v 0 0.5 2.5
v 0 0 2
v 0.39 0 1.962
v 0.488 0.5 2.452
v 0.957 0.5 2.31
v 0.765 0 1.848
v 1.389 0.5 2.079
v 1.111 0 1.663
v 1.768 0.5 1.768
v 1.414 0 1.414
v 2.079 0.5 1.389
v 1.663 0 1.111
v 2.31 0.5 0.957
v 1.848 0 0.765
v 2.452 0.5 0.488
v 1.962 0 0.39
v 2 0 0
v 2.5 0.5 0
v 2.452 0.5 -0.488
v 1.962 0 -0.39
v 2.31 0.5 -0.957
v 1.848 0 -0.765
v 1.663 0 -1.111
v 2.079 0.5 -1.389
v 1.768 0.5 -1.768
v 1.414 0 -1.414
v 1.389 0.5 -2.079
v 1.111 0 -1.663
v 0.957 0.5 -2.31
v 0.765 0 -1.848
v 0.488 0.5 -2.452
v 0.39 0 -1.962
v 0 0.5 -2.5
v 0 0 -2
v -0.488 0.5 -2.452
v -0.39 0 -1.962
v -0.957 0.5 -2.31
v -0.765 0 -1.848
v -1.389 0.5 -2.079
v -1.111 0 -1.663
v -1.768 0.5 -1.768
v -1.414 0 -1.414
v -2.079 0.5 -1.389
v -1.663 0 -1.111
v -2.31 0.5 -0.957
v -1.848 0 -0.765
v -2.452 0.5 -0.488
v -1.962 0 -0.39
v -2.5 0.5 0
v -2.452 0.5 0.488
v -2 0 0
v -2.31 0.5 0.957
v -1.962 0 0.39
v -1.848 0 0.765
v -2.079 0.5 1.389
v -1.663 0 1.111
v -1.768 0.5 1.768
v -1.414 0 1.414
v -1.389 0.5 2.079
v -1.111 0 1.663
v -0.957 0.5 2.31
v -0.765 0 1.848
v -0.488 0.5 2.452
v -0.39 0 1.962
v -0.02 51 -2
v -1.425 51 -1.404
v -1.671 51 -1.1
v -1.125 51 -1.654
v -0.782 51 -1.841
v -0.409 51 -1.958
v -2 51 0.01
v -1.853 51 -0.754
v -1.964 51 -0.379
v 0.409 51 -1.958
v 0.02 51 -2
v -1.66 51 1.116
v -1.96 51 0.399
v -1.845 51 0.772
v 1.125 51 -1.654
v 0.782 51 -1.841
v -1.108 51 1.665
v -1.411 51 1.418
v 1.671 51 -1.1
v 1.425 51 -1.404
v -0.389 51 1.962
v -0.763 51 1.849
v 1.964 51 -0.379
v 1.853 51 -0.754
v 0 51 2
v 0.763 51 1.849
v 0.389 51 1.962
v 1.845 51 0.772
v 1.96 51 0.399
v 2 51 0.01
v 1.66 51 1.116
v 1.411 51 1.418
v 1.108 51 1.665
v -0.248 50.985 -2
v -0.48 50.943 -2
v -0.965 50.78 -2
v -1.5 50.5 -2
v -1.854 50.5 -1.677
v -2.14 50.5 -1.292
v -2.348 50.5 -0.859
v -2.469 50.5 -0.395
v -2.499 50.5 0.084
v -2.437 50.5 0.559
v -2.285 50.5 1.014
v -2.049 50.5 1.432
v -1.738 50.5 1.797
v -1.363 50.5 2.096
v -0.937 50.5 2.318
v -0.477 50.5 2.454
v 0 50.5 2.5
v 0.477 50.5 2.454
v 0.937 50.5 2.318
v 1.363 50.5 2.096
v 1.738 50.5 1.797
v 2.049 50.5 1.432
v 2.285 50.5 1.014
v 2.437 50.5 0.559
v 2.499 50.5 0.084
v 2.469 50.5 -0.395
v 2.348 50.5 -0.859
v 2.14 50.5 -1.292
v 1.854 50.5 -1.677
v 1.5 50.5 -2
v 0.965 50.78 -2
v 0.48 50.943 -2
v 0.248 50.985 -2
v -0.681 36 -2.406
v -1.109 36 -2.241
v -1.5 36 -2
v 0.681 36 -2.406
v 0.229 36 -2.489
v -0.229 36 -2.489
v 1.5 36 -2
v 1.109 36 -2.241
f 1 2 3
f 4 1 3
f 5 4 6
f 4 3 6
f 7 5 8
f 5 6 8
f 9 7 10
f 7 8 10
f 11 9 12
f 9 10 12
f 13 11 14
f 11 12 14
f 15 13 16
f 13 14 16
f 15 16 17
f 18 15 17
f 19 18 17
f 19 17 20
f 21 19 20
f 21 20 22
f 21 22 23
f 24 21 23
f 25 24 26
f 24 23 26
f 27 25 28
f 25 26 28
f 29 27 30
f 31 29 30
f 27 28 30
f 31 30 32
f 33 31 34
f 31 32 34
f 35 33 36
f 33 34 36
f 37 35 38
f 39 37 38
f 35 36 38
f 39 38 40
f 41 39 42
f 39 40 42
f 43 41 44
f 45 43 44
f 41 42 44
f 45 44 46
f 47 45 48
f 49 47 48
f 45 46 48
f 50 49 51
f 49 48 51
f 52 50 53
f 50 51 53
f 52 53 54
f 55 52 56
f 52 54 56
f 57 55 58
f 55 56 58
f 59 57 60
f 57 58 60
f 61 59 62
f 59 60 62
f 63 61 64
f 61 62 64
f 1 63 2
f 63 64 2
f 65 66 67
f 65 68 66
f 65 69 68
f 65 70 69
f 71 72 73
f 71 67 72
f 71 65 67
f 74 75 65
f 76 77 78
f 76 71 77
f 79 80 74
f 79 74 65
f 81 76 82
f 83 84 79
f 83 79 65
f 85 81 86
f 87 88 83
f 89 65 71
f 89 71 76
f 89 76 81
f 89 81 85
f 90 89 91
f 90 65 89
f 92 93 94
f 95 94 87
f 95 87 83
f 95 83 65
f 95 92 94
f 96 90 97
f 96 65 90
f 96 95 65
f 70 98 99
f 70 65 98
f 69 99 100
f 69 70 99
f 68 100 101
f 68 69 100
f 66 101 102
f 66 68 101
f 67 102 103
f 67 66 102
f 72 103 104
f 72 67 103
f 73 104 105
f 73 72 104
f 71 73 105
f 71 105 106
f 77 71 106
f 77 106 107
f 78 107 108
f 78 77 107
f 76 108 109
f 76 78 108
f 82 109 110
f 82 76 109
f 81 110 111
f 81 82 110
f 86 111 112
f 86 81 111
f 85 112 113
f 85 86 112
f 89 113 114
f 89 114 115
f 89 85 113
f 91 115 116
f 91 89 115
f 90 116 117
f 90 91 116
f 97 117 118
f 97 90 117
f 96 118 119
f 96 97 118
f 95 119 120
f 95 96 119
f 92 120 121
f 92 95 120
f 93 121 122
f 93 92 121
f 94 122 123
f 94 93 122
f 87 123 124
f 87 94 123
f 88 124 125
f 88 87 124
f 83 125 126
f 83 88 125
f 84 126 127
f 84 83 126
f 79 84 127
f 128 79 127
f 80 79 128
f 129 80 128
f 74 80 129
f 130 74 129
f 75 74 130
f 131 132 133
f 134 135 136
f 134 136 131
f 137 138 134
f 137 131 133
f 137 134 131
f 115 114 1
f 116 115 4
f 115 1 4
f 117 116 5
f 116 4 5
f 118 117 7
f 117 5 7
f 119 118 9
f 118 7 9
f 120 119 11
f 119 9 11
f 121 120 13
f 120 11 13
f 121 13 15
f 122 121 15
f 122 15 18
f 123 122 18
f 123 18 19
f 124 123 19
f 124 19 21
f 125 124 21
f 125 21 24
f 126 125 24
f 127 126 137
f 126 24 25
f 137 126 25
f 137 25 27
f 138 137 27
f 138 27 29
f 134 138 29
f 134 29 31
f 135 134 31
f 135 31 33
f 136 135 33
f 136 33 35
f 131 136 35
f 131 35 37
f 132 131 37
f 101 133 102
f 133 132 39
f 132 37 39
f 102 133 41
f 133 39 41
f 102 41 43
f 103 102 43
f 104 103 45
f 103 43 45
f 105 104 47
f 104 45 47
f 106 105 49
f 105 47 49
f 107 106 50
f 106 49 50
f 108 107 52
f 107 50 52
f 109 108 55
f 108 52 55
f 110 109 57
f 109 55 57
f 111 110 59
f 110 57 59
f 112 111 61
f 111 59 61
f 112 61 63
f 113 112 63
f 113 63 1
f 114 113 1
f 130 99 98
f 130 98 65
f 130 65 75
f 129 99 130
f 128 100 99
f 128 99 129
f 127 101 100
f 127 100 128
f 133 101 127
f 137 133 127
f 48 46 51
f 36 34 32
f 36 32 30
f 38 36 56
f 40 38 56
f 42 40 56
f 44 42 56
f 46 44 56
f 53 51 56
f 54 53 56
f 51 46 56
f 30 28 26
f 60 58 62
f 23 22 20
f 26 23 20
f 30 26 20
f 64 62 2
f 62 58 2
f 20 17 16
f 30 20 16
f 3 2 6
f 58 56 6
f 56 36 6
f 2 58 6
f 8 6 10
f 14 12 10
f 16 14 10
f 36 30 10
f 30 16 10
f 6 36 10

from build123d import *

# Parameters (mm, degrees)
SKETCH_1_R          = 2.5
EXTRUDE_1_DEPTH     = 51
CUT_EXTRUDE_START   = -15
CUT_EXTRUDE_1_DEPTH = 15
CHAMFER_1_SIZE      = 0.5


with BuildPart() as part:
    # Эскиз1 → Бобышка-Вытянуть1 (new body)
    with BuildSketch(Plane(origin=(0, 0, 0), x_dir=(1, 0, 0), z_dir=(0, 1, 0))):
        with Locations(Location((0, 0, 0), (0, 0, 270))):
            Circle(SKETCH_1_R)
    extrude(amount=EXTRUDE_1_DEPTH)

    # Эскиз2 → Вырез-Вытянуть1 (cut)
    with BuildSketch(Plane(origin=(0, 51, 0), x_dir=(1, 0, 0), z_dir=(0, 1, 0)).offset(CUT_EXTRUDE_START)):
        with BuildLine():
            Line((-1.5, 2), (1.5, 2))
            ThreePointArc((1.5, 2), (0, 2.5), (-1.5, 2))
        make_face()
    extrude(amount=CUT_EXTRUDE_1_DEPTH, mode=Mode.SUBTRACT)

    # Фаска1
    chamfer_1_edges = [part.edges().sort_by_distance(p)[0] for p in [
        (-2.371708245, 51, 0.790569415),
        (0, 0, -2.5),
    ]]
    chamfer(chamfer_1_edges, length=CHAMFER_1_SIZE - 0.0001)  # a hair under: the kernel refuses the full size


solid = part.part
